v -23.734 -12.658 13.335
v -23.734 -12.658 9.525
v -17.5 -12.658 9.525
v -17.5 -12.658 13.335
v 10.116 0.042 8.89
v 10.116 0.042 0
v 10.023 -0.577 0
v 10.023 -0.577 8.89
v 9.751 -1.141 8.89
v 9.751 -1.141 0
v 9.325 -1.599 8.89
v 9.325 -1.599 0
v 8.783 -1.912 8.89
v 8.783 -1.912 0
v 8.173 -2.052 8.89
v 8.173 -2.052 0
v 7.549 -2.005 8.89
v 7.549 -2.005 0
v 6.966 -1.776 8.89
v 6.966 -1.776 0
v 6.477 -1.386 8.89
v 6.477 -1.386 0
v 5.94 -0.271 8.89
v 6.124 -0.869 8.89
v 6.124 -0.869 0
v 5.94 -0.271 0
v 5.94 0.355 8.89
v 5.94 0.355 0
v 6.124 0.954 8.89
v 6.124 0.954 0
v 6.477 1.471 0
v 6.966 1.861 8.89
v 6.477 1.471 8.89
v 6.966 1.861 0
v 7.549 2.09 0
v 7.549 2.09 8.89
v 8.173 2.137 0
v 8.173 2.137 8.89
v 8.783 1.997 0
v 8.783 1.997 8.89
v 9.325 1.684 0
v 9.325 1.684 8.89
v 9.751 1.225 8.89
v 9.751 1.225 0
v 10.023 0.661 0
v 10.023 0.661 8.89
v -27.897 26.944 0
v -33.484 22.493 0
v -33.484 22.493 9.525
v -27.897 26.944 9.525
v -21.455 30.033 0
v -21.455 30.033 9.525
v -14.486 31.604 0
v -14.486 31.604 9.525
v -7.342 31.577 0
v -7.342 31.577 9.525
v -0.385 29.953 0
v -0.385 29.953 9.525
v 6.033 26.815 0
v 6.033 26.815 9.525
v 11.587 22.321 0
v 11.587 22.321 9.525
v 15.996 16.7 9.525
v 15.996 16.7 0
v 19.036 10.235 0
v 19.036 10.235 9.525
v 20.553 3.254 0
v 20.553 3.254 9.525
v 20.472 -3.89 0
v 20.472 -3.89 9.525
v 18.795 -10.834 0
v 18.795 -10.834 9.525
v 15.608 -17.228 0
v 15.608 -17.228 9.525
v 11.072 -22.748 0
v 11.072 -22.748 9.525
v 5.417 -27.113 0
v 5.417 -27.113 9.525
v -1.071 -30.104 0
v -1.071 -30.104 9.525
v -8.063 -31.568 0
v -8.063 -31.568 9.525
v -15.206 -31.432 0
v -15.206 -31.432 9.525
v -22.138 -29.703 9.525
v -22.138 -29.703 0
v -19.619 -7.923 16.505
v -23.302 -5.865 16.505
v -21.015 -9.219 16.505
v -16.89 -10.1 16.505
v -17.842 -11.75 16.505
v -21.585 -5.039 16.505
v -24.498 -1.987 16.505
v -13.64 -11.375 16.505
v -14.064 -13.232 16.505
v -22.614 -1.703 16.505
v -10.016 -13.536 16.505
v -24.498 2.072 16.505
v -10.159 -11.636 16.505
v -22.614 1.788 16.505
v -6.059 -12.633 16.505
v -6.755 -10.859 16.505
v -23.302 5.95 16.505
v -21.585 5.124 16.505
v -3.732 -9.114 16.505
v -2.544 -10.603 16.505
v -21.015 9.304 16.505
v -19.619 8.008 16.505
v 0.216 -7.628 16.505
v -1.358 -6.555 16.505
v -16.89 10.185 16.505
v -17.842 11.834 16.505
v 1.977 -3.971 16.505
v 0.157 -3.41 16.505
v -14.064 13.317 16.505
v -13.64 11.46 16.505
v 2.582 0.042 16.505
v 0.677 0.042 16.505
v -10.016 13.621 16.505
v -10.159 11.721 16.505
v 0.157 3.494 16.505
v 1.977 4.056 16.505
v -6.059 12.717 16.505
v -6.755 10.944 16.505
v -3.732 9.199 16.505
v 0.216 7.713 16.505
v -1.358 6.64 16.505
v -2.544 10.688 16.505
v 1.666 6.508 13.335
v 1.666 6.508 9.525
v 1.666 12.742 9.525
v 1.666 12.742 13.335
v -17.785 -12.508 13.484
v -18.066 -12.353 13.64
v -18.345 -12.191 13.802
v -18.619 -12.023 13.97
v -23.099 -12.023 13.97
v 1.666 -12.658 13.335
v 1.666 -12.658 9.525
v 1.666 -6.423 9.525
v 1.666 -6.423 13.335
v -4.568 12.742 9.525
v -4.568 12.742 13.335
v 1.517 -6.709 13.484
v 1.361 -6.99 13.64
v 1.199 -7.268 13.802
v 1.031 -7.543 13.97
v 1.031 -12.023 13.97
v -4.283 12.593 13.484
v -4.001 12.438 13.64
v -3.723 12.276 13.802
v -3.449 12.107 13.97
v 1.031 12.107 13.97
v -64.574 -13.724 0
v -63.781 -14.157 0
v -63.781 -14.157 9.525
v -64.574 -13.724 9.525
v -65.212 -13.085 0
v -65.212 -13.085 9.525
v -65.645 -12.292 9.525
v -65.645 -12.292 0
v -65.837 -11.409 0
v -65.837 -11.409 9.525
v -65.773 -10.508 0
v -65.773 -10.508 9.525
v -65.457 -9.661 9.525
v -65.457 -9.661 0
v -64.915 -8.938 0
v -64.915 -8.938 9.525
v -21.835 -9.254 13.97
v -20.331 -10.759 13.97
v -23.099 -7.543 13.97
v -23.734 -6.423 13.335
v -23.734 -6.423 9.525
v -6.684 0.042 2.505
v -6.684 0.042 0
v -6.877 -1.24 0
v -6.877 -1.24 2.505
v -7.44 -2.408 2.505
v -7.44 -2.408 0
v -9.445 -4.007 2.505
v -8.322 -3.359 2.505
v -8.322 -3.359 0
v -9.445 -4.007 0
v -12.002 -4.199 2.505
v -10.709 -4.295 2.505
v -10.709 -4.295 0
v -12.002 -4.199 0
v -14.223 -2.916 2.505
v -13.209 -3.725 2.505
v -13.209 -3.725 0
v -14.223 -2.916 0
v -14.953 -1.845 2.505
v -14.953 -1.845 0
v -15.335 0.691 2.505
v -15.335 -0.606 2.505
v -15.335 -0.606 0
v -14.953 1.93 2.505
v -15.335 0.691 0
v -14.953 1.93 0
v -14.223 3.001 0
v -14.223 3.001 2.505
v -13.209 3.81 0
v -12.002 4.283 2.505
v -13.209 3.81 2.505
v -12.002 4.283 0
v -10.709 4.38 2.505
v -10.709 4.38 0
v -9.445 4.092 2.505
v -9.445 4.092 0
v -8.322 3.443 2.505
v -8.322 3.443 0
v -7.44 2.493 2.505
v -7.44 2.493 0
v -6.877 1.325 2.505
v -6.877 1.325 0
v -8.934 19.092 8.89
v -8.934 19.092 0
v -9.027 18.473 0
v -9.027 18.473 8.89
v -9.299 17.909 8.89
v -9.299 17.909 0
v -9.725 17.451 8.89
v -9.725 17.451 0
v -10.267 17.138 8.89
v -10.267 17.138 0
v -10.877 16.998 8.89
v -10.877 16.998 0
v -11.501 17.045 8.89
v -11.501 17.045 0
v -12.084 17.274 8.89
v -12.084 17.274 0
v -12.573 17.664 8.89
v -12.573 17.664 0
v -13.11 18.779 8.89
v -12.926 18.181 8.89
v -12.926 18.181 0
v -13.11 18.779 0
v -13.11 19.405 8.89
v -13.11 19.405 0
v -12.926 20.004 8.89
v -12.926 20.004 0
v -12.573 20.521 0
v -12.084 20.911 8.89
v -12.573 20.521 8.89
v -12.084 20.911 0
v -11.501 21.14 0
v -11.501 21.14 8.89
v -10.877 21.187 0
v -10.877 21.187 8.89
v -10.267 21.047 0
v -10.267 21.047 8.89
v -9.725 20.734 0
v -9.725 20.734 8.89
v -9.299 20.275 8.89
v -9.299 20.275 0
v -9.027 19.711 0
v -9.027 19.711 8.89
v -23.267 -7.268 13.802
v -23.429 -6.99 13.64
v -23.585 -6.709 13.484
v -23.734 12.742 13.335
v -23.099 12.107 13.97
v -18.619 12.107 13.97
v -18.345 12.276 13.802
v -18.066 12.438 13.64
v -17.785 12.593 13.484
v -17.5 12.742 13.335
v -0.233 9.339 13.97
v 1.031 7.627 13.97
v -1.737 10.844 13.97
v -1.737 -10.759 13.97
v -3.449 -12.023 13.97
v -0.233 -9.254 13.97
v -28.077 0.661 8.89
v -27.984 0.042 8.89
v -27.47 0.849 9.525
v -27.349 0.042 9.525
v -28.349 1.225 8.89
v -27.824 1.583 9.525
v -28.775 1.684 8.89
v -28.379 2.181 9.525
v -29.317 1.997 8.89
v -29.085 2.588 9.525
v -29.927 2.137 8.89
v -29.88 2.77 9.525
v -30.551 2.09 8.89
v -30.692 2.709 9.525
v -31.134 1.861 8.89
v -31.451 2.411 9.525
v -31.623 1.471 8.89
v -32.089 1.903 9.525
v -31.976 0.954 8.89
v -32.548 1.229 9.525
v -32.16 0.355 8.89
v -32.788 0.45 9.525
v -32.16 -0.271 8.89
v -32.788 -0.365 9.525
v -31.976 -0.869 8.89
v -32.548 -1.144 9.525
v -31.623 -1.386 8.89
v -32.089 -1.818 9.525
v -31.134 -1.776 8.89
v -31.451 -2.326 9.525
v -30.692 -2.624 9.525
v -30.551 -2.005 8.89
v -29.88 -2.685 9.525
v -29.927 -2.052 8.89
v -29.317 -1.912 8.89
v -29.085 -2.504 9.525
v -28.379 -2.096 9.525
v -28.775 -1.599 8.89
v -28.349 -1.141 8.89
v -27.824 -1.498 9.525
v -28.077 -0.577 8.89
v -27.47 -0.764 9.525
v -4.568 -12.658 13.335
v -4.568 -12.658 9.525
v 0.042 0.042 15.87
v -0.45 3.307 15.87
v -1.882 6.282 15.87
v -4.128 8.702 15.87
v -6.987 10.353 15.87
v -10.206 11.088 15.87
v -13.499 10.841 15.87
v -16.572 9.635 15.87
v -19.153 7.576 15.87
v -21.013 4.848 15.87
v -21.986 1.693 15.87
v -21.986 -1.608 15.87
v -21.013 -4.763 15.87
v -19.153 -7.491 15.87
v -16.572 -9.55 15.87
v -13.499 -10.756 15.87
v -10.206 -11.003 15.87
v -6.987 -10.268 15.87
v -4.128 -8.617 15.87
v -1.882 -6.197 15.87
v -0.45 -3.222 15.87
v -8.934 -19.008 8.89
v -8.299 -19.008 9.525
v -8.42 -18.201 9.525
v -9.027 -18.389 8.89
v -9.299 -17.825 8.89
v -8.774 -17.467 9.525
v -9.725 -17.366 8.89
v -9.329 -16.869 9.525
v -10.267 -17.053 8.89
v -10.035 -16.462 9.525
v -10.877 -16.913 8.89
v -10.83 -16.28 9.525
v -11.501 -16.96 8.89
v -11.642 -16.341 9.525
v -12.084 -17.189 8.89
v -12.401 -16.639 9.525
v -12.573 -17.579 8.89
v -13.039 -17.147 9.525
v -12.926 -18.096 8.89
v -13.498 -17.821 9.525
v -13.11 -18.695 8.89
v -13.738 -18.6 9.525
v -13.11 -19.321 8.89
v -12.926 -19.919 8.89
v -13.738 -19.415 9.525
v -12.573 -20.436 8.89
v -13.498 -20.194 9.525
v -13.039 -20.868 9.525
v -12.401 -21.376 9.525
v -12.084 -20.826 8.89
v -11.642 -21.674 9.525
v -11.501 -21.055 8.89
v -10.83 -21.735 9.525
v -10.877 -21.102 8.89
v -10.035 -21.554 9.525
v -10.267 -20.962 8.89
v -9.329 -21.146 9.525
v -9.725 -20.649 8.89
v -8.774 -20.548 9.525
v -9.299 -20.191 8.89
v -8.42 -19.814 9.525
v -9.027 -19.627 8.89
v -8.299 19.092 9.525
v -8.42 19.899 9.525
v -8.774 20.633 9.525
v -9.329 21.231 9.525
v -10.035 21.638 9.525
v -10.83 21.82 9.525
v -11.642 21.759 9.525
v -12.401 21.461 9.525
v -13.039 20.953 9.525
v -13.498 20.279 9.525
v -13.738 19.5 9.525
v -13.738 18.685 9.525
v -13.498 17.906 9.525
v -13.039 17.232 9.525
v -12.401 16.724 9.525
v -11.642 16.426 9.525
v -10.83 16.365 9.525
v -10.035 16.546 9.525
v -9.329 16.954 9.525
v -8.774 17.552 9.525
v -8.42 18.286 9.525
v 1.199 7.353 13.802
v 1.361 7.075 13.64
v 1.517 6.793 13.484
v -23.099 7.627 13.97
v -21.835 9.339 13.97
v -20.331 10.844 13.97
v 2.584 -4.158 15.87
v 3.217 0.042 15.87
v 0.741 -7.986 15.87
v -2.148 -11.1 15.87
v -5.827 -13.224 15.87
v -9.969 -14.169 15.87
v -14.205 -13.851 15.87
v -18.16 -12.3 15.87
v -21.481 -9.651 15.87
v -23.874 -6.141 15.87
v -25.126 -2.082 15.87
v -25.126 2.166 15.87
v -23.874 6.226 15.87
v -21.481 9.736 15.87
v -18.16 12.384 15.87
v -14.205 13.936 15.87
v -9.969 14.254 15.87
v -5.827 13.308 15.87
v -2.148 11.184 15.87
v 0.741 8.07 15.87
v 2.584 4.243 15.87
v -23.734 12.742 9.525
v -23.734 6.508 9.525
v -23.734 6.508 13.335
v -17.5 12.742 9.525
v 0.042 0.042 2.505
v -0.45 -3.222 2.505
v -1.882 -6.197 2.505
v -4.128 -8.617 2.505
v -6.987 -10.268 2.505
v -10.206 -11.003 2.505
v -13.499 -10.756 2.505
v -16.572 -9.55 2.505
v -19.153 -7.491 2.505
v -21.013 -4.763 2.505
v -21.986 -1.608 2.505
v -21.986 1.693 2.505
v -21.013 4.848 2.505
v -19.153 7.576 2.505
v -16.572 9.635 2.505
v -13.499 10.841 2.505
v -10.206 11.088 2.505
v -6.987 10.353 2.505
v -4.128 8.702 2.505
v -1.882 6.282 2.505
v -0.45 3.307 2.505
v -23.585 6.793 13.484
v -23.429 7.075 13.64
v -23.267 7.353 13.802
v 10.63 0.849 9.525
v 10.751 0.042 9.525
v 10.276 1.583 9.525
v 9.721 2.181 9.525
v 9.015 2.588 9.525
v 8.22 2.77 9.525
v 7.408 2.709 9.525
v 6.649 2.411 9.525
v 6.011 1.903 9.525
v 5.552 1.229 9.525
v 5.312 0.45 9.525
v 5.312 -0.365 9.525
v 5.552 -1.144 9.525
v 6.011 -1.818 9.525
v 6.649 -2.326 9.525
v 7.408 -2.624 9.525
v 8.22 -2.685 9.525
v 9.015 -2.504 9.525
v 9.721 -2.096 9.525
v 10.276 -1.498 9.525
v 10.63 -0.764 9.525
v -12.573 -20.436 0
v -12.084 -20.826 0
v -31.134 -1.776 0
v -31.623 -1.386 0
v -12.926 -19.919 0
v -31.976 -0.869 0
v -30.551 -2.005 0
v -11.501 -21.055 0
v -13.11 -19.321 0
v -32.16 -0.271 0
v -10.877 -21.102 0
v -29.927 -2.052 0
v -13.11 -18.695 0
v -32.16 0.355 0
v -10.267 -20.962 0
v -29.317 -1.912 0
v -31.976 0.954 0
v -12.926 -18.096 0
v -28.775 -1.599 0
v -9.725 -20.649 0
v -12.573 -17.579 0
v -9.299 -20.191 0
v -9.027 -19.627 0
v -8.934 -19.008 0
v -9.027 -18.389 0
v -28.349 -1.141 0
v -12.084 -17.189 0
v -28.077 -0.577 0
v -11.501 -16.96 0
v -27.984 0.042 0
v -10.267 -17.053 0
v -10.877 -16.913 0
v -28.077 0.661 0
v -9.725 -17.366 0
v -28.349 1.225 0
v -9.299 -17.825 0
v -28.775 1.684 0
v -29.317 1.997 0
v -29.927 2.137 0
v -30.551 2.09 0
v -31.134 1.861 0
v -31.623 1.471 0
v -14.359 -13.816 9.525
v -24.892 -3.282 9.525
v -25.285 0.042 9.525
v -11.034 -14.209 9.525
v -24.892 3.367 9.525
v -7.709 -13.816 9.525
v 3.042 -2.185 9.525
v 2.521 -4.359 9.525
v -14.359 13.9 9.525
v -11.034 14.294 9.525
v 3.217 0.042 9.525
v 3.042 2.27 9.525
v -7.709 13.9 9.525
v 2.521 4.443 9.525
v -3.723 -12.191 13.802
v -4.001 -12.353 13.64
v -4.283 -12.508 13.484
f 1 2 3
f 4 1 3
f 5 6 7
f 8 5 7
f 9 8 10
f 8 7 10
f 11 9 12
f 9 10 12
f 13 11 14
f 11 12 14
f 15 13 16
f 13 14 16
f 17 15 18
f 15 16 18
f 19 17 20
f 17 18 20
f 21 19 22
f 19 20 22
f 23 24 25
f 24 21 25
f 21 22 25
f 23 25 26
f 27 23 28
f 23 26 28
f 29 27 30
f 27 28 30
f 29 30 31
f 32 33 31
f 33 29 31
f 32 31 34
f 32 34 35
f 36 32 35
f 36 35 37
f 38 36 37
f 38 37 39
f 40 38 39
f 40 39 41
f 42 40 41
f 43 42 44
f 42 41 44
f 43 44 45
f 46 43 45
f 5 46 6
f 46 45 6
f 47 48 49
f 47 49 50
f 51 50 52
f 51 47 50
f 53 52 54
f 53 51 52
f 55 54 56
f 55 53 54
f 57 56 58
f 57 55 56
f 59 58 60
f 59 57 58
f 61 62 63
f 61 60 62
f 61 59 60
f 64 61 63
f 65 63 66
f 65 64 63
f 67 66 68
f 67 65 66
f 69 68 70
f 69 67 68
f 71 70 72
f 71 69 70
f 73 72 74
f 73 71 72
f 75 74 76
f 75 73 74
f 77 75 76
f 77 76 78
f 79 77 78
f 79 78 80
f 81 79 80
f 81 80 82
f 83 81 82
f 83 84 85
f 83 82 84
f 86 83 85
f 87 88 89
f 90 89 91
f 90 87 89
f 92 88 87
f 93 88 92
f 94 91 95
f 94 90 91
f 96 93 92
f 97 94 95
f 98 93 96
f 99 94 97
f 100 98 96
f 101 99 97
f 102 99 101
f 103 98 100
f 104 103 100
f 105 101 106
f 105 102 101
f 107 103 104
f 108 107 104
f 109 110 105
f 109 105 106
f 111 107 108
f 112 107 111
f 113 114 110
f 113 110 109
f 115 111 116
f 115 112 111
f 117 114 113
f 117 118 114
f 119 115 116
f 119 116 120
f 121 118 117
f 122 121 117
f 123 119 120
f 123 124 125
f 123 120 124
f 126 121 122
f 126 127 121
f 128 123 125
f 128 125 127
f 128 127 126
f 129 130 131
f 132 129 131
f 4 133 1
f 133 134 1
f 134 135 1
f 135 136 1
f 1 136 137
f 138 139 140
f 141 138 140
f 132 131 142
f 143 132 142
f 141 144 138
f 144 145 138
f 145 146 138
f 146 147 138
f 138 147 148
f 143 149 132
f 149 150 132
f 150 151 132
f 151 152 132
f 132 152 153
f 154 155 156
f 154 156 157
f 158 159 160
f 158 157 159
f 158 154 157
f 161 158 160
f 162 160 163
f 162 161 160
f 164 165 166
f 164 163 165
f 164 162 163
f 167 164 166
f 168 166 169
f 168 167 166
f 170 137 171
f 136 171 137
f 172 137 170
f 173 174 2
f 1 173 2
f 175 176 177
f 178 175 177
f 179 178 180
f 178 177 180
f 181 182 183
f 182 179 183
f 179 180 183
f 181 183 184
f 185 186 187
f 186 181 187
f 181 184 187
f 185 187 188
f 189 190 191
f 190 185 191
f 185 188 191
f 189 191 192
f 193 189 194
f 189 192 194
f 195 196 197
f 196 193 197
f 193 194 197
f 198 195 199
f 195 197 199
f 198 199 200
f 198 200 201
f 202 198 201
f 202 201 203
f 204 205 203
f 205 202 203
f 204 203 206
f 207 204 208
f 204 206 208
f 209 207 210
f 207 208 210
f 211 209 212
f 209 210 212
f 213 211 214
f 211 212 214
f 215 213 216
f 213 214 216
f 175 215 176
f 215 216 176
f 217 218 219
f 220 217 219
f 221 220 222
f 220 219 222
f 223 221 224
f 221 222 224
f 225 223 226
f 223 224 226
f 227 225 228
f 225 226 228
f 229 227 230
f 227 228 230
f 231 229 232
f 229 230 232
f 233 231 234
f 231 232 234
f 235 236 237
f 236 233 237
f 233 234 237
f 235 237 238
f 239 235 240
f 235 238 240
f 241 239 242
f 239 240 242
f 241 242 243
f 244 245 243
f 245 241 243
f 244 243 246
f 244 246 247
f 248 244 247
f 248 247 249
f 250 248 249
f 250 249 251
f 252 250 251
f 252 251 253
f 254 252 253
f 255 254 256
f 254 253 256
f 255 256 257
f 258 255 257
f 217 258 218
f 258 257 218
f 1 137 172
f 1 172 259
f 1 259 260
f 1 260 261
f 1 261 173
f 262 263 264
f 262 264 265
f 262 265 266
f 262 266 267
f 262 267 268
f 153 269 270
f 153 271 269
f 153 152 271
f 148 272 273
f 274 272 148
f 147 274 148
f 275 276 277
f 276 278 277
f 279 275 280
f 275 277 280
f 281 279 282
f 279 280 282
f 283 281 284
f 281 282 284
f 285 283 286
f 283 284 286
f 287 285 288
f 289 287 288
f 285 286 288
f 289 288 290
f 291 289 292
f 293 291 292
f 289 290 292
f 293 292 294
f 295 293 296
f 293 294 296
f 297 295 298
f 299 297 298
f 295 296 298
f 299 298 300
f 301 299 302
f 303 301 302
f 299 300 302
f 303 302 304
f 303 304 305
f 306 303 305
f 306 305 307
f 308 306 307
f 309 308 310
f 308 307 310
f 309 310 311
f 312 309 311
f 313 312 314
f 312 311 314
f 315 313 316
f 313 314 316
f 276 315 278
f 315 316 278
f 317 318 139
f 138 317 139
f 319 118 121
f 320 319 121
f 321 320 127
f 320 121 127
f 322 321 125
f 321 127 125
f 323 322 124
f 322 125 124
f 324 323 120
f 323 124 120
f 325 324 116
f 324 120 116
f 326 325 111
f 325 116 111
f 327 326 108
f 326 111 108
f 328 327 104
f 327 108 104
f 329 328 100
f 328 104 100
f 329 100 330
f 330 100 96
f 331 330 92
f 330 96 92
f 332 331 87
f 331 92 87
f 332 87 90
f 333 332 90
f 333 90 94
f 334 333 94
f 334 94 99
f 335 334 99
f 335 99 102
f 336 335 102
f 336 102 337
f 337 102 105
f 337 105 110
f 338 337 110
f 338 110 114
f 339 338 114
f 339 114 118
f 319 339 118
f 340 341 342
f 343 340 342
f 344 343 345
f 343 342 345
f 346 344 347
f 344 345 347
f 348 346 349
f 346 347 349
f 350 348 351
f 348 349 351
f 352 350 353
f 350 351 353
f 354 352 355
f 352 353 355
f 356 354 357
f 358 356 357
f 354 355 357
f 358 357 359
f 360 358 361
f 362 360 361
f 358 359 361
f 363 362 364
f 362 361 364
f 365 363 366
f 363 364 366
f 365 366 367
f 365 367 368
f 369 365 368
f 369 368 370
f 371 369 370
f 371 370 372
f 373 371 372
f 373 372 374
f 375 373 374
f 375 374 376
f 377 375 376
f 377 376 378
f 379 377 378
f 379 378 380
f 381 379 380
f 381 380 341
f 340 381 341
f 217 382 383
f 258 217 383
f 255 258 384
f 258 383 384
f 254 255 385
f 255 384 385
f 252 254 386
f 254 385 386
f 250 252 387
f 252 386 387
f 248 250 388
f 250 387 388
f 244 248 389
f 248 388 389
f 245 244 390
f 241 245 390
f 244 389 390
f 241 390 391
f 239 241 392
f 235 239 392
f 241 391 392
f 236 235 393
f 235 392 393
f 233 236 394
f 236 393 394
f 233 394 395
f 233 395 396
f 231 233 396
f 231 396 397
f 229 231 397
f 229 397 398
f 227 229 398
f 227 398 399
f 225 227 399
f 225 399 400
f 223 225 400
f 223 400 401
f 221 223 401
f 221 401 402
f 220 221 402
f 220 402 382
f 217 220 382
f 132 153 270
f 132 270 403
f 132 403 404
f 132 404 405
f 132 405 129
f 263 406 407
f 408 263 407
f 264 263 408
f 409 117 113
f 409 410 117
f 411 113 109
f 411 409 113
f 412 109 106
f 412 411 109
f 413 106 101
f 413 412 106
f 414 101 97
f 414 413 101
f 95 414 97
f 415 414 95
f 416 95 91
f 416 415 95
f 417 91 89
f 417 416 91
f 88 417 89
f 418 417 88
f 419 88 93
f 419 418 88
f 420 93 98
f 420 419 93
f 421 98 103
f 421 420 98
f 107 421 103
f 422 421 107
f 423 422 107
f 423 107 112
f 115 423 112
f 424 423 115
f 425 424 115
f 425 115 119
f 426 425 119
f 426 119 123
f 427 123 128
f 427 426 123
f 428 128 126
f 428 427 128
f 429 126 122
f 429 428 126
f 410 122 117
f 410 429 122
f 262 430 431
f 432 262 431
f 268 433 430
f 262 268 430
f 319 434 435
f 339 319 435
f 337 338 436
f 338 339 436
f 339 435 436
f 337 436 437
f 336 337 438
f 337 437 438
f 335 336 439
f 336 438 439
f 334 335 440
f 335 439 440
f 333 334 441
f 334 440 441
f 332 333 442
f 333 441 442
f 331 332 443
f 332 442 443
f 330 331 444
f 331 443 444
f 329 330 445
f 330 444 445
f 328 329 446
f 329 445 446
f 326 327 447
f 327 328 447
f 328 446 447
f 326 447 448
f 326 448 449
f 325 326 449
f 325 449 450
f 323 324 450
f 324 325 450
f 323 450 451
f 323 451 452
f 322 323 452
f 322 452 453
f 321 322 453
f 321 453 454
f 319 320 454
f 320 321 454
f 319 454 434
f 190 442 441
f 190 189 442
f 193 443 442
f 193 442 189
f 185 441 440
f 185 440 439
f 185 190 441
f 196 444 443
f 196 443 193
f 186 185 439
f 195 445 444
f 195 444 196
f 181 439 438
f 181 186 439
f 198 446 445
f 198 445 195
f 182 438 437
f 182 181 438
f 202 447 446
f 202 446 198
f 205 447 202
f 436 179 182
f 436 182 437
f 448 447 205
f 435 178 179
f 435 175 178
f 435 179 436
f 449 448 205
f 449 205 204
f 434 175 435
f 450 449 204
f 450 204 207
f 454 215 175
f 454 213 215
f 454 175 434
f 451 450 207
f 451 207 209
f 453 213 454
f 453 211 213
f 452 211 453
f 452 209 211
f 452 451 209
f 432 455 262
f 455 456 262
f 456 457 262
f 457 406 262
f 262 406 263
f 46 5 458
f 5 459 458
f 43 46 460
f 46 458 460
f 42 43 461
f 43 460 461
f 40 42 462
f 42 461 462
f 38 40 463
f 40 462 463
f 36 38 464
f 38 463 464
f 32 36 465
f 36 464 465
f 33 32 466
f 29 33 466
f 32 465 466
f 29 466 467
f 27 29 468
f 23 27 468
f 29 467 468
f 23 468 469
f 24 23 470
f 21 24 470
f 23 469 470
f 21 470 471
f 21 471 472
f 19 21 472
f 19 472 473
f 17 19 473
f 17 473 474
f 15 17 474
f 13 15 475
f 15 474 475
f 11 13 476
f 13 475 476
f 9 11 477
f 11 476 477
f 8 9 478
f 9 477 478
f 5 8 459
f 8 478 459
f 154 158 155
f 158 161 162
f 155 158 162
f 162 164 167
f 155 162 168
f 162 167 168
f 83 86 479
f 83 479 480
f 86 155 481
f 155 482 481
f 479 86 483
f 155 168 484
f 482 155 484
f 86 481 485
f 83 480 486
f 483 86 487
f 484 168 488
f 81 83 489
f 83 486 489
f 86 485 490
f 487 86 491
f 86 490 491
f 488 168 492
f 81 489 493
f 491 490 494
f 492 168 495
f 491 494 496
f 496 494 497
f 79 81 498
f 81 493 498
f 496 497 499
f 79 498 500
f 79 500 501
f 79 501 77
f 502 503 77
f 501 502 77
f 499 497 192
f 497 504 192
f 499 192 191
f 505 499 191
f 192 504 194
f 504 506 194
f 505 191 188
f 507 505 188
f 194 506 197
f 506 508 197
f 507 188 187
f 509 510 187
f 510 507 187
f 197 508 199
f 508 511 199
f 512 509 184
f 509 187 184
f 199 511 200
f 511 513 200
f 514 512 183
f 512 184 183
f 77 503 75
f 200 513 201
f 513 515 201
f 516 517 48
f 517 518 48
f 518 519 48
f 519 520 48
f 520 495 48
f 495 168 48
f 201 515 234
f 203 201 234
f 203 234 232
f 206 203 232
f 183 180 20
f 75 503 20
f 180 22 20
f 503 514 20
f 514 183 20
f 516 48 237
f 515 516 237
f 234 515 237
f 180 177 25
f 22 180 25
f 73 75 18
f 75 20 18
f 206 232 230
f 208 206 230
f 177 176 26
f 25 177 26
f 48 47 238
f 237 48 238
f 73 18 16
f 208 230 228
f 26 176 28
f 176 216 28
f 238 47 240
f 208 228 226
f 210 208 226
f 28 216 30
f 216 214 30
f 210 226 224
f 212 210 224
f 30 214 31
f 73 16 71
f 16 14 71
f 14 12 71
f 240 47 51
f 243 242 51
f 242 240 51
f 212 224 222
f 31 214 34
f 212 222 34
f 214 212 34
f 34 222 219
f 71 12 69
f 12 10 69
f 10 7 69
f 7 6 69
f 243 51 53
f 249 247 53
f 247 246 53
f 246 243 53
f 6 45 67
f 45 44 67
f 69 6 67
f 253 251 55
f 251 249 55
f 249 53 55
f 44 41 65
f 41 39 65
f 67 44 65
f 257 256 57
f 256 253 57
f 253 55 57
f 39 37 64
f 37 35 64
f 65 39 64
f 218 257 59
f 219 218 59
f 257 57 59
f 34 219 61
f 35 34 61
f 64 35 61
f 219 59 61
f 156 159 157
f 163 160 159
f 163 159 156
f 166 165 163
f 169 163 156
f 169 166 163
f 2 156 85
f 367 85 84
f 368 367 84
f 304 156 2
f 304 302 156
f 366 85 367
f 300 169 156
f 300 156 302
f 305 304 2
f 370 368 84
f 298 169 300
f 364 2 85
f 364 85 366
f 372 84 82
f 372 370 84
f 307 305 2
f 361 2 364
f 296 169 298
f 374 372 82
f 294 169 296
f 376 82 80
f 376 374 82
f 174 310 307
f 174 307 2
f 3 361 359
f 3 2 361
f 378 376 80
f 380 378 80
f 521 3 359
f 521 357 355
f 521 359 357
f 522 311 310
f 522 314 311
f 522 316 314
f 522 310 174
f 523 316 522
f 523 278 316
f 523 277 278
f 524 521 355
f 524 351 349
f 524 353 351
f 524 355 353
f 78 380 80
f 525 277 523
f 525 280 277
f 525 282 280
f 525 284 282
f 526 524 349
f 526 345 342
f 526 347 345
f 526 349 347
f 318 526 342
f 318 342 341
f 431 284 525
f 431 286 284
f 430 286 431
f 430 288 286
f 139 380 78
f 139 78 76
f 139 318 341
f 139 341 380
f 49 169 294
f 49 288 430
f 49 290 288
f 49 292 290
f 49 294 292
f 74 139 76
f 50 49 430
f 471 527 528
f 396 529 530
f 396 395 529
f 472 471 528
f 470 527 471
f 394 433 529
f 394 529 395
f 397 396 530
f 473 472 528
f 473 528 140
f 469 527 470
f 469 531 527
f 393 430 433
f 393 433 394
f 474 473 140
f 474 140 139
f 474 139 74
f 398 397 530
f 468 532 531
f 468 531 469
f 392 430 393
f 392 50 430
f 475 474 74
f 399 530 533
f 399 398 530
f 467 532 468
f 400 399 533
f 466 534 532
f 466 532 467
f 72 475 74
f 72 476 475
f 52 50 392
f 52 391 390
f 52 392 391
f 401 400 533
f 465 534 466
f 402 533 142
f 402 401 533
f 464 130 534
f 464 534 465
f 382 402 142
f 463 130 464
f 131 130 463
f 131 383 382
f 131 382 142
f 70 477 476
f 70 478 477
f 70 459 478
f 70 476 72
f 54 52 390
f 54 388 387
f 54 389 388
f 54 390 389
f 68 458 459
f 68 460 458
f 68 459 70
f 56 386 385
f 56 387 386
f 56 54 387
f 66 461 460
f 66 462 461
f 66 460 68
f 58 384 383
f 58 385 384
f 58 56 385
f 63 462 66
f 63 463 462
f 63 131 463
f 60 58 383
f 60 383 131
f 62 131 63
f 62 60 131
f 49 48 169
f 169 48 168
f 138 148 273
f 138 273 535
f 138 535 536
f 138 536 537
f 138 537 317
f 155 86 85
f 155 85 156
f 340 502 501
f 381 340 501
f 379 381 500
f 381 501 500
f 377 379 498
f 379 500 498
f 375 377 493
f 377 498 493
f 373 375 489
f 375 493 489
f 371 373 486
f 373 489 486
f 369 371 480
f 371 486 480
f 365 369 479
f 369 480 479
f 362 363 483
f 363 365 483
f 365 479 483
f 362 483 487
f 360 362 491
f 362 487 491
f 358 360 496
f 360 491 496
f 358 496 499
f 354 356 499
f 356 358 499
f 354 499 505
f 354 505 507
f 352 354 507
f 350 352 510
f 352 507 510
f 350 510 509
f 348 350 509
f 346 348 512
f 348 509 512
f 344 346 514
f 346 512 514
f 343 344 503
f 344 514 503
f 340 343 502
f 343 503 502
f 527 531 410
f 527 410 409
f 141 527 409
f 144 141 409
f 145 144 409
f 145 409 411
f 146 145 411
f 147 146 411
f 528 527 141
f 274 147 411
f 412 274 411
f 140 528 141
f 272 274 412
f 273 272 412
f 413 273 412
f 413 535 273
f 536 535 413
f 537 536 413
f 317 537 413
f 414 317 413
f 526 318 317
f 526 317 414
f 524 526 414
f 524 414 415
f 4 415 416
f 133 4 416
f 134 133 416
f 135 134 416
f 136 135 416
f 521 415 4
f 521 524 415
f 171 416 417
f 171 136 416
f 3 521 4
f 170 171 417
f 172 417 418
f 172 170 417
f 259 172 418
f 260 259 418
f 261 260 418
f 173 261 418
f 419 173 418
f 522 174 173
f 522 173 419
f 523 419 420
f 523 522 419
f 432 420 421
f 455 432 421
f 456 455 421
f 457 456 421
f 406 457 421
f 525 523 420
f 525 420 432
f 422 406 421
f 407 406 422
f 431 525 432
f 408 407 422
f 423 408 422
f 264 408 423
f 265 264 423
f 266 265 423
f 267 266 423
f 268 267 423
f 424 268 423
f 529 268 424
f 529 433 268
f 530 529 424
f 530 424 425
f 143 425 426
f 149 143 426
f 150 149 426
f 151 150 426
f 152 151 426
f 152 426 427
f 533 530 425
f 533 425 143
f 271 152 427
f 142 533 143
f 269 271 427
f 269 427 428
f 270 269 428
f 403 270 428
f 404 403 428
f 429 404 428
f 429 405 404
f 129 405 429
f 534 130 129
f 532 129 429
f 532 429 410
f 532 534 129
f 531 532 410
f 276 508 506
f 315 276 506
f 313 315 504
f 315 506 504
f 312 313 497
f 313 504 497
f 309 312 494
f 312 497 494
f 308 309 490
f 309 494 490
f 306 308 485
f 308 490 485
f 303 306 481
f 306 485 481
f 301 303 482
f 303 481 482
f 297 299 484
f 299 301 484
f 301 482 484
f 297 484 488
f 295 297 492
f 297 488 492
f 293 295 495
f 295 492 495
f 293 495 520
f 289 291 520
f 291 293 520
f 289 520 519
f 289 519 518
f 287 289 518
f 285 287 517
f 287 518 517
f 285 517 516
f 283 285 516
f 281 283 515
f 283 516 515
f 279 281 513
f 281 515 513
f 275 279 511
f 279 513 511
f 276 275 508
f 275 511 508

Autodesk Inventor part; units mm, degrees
ref_plane "YZ Plane" through (0, 0, 0) normal (1, 0, 0) x (0, 1, 0)
ref_plane "XZ Plane" through (0, 0, 0) normal (0, 1, 0) x (-1, 0, 0)
ref_plane "XY Plane" through (0, 0, 0) normal (0, 0, 1) x (1, 0, 0)
ref_plane "Work Plane1" through (-0.0339, 0.0424, 0) normal (0, 0, 1) x (1, 0, 0)
sketch "Sketch1" plane through (-0.0339, 0.0424, 0) normal (0, 0, 1) x (1, 0, 0)
  circle A0 centre (-11, 0) radius 11 projected
  circle A1 centre (-11, 0) radius 11.0762
  arc A2 (-22.1037, -29.7451) -> (-33.4506, 22.4506) centre (-11, 0) ccw
  line L0 (1.7, 12.7) -> (-23.7, 12.7)
  line L1 (-23.7, 12.7) -> (-23.7, -12.7)
  line L2 (-23.7, -12.7) -> (1.7, -12.7)
  line L3 (1.7, -12.7) -> (1.7, 12.7)
  line L4 (1.7, 12.7) -> (-23.7, -12.7) construction
  line L5 (-23.7, 12.7) -> (1.7, -12.7) construction
  circle A3 centre (8.05, 0) radius 2.1
  circle A4 centre (-11, 19.05) radius 2.1
  circle A5 centre (-30.05, 0) radius 2.1
  circle A6 centre (-11, -19.05) radius 2.1
  circle A7 centre (-11, 0) radius 14.2512
  circle A8 centre (-11, 0) radius 4.35
  line L6 (-33.4506, 22.4506) -> (-64.8815, -8.9803)
  arc A9 (-64.8815, -8.9803) -> (-63.7468, -14.1998) centre (-62.6365, -11.2253) ccw
  line L7 (-22.1037, -29.7451) -> (-63.7468, -14.1998)
  line L8 (-46.921, 8.9803) -> (-64.8815, -8.9803)
  point P0 (0.0339, -0.0424)
  point P1 (-23.7, 6.4658)
  point P2 (-17.4658, 12.7)
  point P3 (-17.4658, -12.7)
  point P4 (-23.7, -6.4658)
  point P5 (1.7, -6.4658)
  point P6 (-4.5342, -12.7)
  point P7 (-4.5342, 12.7)
  point P8 (1.7, 6.4658)
  point P9 (-42.4309, 4.4901)
  dimension "d0" = 0.0762
  dimension "d1" = 63.5
  dimension "d2" = 25.4
  dimension "d3" = 25.4
  dimension "d4" = 4.2
  dimension "d5" = 19.05
  dimension "d8" = 360
  dimension "d10" = 3.175
  dimension "d15" = 8.7
  dimension "d23" = 6.35
extrude "Extrusion1" add sketch "Sketch1" along normal blind 16.505 contours A7 L3 L2 L1 L0 | L0 A7 | A7 L3 | L1 A7 | A7 L2
extrude "Extrusion2" add sketch "Sketch1" along normal blind 9.525 contours L7 A9 L6 A2 | L3 A7 L0 | A7 L3 L2 L1 L0 | L0 A7 | A7 L3 | A7 L1 L0 | L3 L2 A7 | L1 A7 | A7 L2 | A7 L2 L1
extrude "Extrusion3" add sketch "Sketch1" along normal blind 2.505 contours A0 | A1
extrude "Extrusion4" add sketch "Sketch1" along normal blind 13.97 contours L3 A7 L0 | A7 L1 L0 | L3 L2 A7 | A7 L2 L1
chamfer "Chamfer1" distance 0.635 angle 45 14 edges at (-22.1101, 0.0424, 16.505) (5.9161, 0.0424, 9.525) (-13.1339, 19.0924, 9.525) (-13.1339, -19.0076, 9.525) (-32.1839, 0.0424, 9.525) (1.6661, 9.6253, 13.97) (-1.451, 12.7424, 13.97) (-20.6168, 12.7424, 13.97) (-23.7339, 9.6253, 13.97) (1.6661, -9.5405, 13.97) (-1.451, -12.6576, 13.97) (-23.7339, -9.5405, 13.97) (-20.6168, -12.6576, 13.97) (-25.2851, 0.0424, 16.505)
properties part number "WeightBearingMount"
